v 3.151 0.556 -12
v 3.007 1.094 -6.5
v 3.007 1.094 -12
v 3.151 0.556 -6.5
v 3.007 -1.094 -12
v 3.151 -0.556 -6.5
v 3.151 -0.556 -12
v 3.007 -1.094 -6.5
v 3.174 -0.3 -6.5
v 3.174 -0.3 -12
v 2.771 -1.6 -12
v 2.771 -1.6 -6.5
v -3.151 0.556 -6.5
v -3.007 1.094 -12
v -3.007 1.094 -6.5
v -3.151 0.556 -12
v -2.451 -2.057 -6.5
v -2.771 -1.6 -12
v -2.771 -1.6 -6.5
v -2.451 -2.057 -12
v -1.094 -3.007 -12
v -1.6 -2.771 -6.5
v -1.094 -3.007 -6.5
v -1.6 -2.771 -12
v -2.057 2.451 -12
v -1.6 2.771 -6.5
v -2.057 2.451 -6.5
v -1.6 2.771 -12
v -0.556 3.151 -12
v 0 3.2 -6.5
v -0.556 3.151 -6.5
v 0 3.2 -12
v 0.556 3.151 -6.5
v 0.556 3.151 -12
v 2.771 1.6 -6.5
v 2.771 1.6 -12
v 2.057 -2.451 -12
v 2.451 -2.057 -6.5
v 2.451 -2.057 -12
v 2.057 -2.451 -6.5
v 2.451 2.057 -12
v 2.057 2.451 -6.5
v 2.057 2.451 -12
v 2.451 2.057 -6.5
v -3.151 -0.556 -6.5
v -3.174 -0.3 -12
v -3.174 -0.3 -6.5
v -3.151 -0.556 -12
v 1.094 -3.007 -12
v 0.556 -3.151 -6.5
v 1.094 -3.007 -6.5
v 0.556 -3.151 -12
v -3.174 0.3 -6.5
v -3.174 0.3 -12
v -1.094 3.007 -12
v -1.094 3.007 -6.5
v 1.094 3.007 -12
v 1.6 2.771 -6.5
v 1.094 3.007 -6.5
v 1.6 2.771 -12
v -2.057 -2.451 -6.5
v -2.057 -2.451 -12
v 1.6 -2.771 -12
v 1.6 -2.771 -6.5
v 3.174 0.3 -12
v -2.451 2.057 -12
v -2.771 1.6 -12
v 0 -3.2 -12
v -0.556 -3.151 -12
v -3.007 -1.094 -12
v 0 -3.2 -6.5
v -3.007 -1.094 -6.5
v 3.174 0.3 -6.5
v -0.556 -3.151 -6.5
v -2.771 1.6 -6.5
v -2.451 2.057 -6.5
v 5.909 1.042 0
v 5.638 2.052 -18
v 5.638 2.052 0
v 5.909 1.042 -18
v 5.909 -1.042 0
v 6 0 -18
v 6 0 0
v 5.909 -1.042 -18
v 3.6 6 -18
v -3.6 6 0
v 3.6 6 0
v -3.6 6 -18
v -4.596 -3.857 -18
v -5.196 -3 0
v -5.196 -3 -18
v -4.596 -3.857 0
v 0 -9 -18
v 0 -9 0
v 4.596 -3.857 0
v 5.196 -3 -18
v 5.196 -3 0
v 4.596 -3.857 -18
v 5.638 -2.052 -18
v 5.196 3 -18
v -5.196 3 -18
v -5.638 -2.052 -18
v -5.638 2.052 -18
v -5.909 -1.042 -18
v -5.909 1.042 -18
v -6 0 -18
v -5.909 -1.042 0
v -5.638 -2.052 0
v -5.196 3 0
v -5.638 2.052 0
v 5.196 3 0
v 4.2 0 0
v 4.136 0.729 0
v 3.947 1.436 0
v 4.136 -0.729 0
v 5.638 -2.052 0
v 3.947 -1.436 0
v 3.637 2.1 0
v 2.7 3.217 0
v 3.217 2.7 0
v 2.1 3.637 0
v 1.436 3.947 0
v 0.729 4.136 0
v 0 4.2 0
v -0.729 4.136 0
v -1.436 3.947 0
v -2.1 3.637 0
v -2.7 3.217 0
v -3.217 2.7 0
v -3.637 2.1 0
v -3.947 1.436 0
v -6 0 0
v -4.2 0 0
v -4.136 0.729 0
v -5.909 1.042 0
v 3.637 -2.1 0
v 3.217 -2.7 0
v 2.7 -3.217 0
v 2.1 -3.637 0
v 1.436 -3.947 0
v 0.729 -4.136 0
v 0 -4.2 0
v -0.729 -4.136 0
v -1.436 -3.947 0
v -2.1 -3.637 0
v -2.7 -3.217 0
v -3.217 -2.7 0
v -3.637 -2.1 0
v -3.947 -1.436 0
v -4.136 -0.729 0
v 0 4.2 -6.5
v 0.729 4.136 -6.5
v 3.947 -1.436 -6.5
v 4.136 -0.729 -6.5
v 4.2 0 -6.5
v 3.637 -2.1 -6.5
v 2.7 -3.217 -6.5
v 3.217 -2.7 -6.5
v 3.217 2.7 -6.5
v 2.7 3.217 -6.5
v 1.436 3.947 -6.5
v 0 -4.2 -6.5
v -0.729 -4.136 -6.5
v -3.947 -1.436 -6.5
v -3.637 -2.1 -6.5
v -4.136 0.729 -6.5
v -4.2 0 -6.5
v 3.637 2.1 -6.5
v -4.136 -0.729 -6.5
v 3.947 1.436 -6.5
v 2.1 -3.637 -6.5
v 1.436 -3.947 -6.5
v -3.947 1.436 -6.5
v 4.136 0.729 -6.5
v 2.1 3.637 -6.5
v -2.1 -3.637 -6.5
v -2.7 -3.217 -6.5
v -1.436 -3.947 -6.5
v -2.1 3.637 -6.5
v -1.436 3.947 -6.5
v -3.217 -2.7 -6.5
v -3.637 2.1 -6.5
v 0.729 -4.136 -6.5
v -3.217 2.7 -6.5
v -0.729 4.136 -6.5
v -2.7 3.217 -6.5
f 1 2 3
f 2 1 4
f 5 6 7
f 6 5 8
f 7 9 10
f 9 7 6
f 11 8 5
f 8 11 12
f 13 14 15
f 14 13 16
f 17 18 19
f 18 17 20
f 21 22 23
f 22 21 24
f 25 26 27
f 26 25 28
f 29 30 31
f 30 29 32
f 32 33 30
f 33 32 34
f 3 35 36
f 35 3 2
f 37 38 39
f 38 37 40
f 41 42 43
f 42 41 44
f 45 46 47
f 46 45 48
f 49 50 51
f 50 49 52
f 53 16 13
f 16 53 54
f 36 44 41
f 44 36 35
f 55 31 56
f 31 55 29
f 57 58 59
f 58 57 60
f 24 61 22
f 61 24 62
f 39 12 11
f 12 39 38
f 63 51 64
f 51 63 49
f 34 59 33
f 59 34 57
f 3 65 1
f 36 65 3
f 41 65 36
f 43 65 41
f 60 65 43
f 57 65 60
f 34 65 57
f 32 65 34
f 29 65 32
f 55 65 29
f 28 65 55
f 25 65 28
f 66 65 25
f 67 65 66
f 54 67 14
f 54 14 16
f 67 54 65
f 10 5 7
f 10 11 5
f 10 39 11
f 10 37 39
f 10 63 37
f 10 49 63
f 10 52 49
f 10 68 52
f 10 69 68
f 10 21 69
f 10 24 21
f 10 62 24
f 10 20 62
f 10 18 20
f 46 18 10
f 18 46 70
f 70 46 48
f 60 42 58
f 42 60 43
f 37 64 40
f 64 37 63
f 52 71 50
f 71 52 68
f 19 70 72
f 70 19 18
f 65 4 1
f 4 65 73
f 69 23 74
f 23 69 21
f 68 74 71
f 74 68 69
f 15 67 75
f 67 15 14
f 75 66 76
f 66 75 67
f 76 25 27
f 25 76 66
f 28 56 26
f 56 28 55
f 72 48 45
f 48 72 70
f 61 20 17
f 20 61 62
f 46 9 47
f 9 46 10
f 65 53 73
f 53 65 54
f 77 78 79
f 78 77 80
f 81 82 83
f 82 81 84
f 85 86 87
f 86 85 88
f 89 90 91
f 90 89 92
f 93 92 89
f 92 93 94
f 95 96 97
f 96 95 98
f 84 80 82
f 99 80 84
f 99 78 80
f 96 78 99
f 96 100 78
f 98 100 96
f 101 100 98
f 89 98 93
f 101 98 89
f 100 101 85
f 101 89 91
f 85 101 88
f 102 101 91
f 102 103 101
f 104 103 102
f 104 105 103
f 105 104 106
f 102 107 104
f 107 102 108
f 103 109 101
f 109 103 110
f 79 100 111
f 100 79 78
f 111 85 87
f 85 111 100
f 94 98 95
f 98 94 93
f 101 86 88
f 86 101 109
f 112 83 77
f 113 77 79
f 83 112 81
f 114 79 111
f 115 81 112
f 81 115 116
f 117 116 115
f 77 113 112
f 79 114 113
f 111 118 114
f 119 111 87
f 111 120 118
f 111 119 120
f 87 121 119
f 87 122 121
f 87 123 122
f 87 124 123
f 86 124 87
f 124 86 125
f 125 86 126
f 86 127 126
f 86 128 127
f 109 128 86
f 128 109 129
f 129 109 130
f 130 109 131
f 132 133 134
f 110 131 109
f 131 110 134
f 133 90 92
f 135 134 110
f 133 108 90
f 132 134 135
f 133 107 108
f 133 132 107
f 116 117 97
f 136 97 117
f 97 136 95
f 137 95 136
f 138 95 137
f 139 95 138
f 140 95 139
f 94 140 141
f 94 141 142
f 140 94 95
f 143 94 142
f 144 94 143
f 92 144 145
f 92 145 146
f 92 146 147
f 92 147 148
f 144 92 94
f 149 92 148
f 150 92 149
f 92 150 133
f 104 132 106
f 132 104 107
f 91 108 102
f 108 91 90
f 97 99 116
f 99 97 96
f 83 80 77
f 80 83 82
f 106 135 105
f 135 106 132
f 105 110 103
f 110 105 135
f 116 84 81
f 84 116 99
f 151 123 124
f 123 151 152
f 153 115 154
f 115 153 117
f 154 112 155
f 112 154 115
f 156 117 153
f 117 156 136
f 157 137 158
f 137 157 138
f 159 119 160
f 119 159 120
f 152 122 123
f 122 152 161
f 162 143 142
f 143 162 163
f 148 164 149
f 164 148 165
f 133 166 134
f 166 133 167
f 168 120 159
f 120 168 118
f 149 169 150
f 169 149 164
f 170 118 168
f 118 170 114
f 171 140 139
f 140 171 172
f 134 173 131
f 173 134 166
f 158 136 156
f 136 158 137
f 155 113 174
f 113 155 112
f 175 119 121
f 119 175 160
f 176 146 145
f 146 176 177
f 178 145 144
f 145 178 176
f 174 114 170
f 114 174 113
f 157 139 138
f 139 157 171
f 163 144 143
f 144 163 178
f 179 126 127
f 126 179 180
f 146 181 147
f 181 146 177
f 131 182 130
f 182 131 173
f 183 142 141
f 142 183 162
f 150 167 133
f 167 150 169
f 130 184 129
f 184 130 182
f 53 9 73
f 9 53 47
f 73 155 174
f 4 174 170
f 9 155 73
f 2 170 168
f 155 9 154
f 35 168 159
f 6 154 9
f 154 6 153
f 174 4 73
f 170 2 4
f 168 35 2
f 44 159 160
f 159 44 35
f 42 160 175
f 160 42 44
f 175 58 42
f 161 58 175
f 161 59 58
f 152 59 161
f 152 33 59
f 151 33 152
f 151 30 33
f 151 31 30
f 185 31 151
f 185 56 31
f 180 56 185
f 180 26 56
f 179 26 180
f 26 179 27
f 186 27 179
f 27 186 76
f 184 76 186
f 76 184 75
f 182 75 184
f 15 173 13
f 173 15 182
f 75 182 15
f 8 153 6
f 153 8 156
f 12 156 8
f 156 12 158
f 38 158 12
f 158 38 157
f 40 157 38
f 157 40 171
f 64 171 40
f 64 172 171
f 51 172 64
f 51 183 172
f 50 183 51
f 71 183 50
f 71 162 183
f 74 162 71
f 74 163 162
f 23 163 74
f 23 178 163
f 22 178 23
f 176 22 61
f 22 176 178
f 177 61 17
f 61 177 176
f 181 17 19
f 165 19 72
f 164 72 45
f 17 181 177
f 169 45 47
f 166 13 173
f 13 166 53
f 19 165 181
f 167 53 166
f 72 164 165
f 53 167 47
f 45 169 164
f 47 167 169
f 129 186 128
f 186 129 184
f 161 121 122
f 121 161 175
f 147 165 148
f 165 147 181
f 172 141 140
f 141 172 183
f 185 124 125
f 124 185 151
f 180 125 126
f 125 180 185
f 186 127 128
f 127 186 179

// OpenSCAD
jeu=0.4;

grp_d=6;
grp_h=6;
grv_w=1;
bas_d=8;
bas_h=6;
knb_d=12;
knb_h=18;

pnt_f=3/2;
pnt_a=90;

module knob(d,h,f,a,j) {
	difference() {
		hull() {
			cylinder(d=d, h=h, $fn=36);
			rotate([0,0,a]) polyhedron(
				points = [ 
					[d*f/2, 0, 0], [-d*f/3, d*f/5, 0], [-d*f/3,-d*f/5, 0],
					[d*f/2, 0, h], [-d*f/3, d*f/5, h], [-d*f/3,-d*f/5, h],
				], 
				faces = [ [0,1,2], [0,1,4,3], [1,2,5,4], [0,2,5,3], [3,4,5]]
			);
		}
		translate([0,0,-0.5])
			cylinder(d=bas_d+j, h=bas_h+1, $fn=36);
		translate([0,0,bas_h])
			difference() {
				cylinder(d=grp_d+j, h=grp_h, $fn=36);
				translate([-(grp_d+1)/2,-(grv_w-j)/2,-0.5])
					cube([grp_d+1, grv_w-j, grp_h+1]);
			}
	}
}

rotate([180,0,0])
	knob(knb_d,knb_h,pnt_f,pnt_a,jeu);
